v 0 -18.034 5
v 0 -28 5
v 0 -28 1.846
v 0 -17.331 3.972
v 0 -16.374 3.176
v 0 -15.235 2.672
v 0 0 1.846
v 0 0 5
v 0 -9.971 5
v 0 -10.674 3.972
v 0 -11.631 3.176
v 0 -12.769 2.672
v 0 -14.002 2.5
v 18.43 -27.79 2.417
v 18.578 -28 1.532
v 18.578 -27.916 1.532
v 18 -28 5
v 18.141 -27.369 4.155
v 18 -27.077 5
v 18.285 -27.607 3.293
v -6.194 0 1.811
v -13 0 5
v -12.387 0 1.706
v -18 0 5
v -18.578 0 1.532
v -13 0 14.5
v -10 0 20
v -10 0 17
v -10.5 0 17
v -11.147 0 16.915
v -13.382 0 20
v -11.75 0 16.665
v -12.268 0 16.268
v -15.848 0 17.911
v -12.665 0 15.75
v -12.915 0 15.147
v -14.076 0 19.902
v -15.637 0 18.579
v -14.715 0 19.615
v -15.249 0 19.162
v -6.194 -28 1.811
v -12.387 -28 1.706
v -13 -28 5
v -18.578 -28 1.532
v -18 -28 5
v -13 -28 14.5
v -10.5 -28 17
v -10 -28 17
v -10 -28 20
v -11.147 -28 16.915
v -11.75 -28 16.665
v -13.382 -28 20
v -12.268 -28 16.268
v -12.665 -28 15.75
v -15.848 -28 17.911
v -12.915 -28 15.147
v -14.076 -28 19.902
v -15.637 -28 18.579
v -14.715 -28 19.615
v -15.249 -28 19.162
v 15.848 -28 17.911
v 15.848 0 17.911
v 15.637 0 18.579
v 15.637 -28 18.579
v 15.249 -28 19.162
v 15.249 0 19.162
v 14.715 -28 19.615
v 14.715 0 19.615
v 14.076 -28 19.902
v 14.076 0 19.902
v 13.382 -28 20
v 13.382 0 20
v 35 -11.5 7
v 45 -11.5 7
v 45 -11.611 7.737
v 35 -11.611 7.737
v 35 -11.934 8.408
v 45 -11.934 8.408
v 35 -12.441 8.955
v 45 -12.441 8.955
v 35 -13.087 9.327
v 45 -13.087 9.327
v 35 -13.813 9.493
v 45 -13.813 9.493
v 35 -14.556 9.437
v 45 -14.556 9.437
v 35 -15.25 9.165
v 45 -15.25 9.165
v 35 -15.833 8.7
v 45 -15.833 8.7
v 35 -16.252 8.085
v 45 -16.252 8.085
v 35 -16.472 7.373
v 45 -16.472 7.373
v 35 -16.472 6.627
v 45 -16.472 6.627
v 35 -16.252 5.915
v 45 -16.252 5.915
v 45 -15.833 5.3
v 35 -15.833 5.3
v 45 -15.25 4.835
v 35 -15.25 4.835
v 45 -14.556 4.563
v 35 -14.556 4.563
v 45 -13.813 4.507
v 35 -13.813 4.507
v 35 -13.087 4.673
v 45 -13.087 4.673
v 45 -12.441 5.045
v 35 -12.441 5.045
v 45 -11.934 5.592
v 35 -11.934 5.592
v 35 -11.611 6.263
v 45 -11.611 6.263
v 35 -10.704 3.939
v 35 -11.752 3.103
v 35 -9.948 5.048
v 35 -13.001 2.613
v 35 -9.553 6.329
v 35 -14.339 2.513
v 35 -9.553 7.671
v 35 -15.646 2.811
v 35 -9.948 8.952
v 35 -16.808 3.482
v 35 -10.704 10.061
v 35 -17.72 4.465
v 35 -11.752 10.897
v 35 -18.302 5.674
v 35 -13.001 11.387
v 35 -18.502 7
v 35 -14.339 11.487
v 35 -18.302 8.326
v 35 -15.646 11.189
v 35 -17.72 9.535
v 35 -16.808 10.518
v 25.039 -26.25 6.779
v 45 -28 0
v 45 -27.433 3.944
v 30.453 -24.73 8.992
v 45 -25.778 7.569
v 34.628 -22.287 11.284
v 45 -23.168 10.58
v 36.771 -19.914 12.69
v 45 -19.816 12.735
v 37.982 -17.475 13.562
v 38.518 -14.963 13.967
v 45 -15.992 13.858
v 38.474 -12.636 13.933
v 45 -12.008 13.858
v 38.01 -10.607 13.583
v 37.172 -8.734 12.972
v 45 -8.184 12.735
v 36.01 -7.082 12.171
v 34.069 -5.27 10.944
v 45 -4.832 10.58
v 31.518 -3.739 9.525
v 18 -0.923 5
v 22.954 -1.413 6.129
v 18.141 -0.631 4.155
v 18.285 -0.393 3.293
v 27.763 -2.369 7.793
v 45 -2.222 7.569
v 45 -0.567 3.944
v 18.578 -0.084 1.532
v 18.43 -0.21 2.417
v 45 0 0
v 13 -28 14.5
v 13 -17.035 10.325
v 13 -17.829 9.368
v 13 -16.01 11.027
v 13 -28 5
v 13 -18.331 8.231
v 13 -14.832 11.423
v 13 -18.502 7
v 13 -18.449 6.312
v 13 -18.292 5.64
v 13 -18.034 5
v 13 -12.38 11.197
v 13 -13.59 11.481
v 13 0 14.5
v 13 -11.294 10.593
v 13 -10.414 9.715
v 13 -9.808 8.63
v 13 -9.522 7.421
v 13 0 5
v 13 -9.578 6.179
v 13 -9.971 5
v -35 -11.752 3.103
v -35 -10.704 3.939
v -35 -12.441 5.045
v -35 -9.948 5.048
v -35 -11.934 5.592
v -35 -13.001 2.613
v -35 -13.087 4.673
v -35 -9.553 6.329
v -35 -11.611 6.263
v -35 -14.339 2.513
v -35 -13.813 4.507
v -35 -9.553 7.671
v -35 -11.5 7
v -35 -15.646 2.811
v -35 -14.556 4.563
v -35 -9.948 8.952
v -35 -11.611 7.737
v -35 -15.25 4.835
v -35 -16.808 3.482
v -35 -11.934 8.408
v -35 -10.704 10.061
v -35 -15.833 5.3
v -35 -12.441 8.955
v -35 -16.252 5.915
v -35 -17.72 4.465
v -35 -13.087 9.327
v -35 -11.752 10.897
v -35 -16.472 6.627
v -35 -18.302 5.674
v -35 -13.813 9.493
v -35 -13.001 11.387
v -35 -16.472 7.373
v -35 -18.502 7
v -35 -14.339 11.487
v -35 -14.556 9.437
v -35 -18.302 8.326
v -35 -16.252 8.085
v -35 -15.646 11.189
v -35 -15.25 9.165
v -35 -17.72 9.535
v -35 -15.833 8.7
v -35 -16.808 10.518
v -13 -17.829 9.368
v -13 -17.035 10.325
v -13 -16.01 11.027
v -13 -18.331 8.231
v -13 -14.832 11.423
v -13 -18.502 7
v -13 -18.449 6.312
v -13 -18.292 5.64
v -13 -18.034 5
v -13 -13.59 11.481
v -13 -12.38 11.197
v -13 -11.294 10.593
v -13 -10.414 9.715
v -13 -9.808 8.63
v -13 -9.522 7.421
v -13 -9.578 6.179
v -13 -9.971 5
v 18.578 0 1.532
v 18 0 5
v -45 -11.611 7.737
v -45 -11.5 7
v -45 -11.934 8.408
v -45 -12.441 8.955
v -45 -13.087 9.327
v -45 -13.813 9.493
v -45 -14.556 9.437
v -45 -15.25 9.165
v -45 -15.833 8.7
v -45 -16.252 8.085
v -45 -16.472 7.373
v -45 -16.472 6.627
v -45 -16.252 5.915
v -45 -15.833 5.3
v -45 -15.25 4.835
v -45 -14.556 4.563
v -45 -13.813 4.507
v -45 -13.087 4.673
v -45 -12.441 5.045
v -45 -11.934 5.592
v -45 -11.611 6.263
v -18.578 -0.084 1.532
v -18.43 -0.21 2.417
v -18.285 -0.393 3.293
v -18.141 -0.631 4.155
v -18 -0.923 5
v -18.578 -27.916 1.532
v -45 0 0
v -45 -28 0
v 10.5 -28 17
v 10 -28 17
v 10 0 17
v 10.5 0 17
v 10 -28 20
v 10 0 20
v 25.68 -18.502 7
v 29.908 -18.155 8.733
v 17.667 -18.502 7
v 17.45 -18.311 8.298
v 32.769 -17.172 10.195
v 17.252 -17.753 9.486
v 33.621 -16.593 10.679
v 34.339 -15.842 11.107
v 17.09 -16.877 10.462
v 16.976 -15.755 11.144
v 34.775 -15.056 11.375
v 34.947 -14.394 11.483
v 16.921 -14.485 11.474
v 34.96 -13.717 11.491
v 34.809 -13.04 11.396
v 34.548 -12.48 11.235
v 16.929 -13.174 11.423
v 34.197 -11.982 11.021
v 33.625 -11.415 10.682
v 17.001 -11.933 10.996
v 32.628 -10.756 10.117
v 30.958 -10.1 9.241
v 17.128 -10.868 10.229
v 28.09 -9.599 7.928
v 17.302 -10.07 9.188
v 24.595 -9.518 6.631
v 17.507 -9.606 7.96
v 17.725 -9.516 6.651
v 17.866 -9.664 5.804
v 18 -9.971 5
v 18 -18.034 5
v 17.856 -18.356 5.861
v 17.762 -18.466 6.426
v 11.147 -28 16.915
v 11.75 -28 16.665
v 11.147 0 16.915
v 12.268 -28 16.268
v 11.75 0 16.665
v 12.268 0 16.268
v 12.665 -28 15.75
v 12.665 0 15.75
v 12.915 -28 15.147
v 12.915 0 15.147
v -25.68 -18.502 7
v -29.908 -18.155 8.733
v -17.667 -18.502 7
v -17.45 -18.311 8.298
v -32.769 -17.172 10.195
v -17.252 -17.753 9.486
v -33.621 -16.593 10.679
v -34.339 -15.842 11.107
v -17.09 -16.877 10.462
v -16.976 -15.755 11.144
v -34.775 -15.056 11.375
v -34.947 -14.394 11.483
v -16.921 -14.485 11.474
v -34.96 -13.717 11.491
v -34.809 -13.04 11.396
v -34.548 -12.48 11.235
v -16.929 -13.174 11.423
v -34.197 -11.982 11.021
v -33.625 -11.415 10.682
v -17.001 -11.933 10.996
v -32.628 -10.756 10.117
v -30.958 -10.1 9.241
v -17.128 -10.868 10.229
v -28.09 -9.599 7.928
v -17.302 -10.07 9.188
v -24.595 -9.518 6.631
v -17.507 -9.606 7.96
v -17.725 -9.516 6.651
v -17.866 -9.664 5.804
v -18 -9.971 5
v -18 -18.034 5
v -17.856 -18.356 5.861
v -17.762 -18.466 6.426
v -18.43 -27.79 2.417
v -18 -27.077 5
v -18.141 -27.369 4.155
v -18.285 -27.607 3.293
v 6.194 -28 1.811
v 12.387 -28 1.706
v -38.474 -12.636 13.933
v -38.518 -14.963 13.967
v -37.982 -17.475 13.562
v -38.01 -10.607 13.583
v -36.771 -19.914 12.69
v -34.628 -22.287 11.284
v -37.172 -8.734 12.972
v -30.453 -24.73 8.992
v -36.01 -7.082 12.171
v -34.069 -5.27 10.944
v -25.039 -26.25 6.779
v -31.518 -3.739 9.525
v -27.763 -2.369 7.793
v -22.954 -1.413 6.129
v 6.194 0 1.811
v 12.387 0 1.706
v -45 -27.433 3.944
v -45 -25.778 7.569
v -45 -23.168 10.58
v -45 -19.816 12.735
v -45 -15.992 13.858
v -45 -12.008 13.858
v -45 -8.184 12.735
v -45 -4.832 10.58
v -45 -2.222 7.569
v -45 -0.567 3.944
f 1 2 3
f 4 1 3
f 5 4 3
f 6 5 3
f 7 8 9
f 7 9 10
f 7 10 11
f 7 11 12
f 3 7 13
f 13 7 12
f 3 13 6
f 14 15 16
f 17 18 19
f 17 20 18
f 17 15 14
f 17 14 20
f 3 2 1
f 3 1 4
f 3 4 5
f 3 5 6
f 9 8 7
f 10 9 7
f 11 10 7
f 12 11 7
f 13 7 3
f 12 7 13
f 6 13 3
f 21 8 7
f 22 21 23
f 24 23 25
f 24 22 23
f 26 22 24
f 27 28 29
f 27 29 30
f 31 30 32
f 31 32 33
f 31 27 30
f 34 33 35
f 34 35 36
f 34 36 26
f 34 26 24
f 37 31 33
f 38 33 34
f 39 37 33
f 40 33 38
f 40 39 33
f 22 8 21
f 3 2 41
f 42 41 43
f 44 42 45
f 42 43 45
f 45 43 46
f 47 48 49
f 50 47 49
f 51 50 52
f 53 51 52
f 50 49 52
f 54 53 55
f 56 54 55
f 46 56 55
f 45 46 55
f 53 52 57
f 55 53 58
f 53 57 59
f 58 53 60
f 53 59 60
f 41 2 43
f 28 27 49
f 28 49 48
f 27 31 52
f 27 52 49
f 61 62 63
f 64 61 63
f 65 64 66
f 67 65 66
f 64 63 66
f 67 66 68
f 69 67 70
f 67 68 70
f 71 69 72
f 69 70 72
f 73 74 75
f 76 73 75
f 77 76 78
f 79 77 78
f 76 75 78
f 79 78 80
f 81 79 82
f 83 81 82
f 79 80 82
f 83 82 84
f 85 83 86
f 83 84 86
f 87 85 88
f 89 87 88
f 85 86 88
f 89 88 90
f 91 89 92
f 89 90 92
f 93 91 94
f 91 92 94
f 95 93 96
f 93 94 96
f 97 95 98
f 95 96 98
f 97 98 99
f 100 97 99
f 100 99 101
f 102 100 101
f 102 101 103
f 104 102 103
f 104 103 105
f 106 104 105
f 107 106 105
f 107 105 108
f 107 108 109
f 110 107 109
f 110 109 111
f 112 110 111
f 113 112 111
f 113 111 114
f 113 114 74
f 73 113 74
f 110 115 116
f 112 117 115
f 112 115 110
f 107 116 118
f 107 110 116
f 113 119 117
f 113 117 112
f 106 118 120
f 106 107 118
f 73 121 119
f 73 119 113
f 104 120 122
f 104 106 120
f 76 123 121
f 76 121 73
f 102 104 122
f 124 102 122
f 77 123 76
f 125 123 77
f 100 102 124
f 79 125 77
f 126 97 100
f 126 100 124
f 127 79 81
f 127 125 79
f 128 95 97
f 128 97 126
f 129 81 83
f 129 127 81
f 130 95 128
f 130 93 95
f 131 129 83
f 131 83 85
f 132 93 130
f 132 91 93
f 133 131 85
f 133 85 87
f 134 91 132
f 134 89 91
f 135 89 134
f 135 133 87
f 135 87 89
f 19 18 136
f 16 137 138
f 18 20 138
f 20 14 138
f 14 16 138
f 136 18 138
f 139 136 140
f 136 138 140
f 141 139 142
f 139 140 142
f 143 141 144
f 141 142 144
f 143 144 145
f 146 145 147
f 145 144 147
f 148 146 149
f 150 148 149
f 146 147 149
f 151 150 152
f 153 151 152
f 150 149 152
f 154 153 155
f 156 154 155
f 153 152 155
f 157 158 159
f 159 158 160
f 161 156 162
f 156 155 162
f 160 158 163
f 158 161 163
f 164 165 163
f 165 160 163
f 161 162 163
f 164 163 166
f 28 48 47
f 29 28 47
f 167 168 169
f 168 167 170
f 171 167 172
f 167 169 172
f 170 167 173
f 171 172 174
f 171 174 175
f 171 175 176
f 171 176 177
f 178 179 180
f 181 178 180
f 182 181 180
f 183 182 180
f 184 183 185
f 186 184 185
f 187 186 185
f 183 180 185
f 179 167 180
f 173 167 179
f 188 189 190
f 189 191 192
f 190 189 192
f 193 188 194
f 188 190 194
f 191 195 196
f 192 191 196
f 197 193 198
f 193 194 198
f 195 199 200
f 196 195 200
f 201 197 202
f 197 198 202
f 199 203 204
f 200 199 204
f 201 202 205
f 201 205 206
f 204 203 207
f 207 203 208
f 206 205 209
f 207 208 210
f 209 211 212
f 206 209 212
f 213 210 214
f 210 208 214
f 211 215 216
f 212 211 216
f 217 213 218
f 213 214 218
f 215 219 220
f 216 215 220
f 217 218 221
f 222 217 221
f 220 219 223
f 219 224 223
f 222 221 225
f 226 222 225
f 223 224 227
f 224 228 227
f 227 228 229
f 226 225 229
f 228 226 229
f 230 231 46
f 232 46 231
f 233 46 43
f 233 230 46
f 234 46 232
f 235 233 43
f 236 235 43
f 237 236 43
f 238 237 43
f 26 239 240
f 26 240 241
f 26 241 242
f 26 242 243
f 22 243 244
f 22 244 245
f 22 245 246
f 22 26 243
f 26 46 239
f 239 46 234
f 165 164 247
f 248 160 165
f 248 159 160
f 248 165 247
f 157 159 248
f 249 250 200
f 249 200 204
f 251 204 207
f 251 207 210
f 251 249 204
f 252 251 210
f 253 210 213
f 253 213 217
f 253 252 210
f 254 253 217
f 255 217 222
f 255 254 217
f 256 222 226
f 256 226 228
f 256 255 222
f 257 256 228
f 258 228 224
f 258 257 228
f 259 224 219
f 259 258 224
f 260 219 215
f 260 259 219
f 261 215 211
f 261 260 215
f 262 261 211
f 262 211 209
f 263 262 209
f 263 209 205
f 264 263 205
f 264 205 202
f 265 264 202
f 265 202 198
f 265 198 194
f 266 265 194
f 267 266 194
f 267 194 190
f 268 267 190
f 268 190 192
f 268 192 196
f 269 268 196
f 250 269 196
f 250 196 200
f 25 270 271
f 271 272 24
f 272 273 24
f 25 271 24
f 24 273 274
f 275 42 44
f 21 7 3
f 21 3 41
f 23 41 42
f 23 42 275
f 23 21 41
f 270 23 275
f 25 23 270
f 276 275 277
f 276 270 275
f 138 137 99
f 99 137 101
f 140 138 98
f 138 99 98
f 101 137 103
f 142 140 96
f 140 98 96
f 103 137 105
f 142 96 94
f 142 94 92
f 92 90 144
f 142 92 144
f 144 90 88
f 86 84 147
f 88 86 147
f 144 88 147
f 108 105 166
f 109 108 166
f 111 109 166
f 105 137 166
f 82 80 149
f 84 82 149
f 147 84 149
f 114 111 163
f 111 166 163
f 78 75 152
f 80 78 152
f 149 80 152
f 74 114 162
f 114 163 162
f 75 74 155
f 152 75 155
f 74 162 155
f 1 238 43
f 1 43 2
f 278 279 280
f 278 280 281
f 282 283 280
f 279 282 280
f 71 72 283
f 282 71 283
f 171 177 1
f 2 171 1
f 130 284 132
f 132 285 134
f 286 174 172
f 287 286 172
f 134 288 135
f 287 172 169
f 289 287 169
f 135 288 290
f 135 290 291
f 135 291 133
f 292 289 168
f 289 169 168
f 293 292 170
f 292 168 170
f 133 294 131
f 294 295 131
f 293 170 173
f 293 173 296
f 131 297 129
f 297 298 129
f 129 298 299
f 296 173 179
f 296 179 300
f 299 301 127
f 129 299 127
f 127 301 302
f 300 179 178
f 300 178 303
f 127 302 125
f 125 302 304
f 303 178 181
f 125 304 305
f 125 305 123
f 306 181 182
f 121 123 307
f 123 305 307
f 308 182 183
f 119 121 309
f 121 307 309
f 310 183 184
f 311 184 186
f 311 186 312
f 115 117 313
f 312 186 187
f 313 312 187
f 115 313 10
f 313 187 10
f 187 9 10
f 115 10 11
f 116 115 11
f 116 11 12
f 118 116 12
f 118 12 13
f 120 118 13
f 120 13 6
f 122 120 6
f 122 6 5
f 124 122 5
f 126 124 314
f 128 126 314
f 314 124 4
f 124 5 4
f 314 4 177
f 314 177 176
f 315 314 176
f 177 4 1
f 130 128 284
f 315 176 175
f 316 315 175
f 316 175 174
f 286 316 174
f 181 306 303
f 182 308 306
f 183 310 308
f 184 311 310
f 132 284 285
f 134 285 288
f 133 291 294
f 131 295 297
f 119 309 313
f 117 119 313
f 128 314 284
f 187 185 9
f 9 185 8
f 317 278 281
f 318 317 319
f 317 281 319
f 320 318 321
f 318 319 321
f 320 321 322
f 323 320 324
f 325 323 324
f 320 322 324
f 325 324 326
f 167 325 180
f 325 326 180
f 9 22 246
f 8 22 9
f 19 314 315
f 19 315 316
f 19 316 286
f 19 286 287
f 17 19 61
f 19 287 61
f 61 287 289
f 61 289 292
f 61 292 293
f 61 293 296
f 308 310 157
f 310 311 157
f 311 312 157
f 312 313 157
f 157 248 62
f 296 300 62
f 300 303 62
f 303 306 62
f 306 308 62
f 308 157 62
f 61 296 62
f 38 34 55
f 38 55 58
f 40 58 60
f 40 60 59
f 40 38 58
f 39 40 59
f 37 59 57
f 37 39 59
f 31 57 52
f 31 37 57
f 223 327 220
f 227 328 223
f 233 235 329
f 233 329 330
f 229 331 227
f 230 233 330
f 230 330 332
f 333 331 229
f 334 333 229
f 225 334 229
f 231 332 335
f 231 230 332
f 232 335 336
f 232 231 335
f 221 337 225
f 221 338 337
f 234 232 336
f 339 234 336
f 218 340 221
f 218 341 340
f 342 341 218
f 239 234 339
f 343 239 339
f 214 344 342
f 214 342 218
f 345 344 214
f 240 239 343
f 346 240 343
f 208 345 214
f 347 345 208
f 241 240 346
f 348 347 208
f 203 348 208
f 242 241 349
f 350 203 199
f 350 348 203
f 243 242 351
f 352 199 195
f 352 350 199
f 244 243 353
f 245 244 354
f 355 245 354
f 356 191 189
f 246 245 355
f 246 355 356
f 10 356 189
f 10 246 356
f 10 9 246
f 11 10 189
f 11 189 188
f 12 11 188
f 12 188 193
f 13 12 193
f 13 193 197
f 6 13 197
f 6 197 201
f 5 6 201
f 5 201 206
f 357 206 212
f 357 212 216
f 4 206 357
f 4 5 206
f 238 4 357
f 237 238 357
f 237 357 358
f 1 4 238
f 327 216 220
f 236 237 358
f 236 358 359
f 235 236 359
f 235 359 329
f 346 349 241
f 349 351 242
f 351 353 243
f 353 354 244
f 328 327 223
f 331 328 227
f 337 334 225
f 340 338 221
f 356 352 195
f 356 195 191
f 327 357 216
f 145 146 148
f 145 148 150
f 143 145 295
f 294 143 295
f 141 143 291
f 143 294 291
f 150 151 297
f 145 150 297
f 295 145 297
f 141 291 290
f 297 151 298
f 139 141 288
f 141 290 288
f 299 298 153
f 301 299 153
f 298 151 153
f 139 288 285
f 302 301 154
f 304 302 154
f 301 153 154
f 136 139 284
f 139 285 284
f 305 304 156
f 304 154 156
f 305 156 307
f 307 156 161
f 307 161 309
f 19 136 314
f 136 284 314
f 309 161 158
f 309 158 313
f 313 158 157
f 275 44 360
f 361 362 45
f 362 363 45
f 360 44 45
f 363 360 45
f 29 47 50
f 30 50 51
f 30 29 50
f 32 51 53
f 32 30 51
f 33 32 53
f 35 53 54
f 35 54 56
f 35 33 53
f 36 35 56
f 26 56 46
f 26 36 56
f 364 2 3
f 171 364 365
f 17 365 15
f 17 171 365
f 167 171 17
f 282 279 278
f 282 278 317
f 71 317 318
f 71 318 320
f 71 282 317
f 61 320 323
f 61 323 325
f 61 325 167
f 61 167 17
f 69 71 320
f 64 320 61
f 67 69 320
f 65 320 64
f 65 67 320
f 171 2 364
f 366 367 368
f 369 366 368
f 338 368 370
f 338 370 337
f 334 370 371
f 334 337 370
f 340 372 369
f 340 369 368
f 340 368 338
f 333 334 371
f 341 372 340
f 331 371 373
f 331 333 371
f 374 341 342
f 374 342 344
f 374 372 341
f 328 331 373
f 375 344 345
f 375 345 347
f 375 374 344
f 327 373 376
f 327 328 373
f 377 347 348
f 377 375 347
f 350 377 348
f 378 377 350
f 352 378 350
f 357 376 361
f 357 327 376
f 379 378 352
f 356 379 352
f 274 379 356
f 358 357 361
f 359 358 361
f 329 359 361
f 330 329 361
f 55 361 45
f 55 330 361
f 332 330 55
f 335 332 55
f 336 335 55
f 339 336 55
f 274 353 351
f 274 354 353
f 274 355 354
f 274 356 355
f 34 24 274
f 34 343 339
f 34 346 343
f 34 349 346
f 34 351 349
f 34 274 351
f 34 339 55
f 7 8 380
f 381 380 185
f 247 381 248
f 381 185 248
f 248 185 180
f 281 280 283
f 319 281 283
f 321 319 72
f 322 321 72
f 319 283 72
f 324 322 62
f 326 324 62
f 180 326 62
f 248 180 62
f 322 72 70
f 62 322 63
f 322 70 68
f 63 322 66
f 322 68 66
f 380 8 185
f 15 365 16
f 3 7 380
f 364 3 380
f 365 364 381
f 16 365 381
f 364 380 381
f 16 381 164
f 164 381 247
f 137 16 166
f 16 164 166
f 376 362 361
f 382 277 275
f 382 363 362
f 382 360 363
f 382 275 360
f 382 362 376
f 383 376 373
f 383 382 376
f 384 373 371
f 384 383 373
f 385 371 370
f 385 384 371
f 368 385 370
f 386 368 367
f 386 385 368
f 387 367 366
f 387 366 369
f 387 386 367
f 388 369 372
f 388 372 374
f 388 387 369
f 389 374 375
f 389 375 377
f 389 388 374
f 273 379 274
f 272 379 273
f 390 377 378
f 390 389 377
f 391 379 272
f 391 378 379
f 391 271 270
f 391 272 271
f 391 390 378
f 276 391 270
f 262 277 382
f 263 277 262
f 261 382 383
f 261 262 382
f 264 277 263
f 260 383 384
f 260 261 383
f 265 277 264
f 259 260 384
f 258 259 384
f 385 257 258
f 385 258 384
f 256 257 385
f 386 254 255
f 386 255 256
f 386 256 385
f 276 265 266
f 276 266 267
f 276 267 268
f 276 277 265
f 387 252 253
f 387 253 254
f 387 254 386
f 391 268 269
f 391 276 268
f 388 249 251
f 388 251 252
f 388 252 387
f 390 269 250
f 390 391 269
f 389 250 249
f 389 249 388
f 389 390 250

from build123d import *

# Parameters (mm, degrees)
F1_DEPTH = 28
F2_R     = 2.5
F3_REACH = 79.4103010682
F4_R     = 4.5
F5_DEPTH = 35


with BuildPart() as f1:
    # F0 (on Front) → F1 (new body)
    with BuildSketch(Plane.XZ):
        with BuildLine():
            ThreePointArc((0, 1.8460551577), (22.518924928, 1.3843473584), (45, 0))
            Line((45, 0), (45, 20))
            ThreePointArc((45, 20), (32.777940188, 10.1997076616), (18, 5))
            Line((18, 5), (15.8481670886, 17.9109974683))
            ThreePointArc((15.8481670886, 17.9109974683), (14.9981195194, 19.4075499562), (13.382182279, 20))
            Line((13.382182279, 20), (10, 20))
            Line((10, 20), (10, 17))
            Line((10, 17), (10.5, 17))
            ThreePointArc((10.5, 17), (12.267766953, 16.267766953), (13, 14.5))
            Line((13, 14.5), (13, 5))
            Line((13, 5), (0, 5))
            Line((0, 5), (0, 1.8460551577))
        make_face()
    extrude(amount=F1_DEPTH)

    f3_end = Plane(origin=(16.9240835443, -14, 11.4554987341), x_dir=(-0.1643989873, 0, 0.9863939238), z_dir=(0.9863939238, 0, 0.1643989873))
    # F2 (on face) → F3 (cut, up to a plane its end follows)
    with BuildSketch(Plane.YZ.offset(45)):
        with BuildLine():
            ThreePointArc((-28, 0), (-14, 14), (0, 0))
            Line((0, 0), (0, 20))
            Line((0, 20), (-28, 20))
            Line((-28, 20), (-28, 0))
        make_face()
        with Locations((-14, 7)):
            Circle(F2_R)
    f3_long = extrude(amount=-F3_REACH, mode=Mode.PRIVATE)
    add(split(f3_long, bisect_by=f3_end, keep=Keep.TOP, mode=Mode.PRIVATE), mode=Mode.SUBTRACT)

    # F4 (on face) → F5 (cut)
    with BuildSketch(Plane(origin=(0, 0, 0), x_dir=(0, -1, 0), z_dir=(-1, 0, 0))):
        with Locations((14.0023827553, 7)):
            Circle(F4_R)
    extrude(amount=-F5_DEPTH, mode=Mode.SUBTRACT)


with BuildPart() as f6_1:
    # F6: instance of F1
    add(f1.part.mirror(Plane(origin=(0, -13.9995349906, 3.3159781589), x_dir=(0, -1, 0), z_dir=(-1, 0, 0))))


solid = Compound([f1.part, f6_1.part])
